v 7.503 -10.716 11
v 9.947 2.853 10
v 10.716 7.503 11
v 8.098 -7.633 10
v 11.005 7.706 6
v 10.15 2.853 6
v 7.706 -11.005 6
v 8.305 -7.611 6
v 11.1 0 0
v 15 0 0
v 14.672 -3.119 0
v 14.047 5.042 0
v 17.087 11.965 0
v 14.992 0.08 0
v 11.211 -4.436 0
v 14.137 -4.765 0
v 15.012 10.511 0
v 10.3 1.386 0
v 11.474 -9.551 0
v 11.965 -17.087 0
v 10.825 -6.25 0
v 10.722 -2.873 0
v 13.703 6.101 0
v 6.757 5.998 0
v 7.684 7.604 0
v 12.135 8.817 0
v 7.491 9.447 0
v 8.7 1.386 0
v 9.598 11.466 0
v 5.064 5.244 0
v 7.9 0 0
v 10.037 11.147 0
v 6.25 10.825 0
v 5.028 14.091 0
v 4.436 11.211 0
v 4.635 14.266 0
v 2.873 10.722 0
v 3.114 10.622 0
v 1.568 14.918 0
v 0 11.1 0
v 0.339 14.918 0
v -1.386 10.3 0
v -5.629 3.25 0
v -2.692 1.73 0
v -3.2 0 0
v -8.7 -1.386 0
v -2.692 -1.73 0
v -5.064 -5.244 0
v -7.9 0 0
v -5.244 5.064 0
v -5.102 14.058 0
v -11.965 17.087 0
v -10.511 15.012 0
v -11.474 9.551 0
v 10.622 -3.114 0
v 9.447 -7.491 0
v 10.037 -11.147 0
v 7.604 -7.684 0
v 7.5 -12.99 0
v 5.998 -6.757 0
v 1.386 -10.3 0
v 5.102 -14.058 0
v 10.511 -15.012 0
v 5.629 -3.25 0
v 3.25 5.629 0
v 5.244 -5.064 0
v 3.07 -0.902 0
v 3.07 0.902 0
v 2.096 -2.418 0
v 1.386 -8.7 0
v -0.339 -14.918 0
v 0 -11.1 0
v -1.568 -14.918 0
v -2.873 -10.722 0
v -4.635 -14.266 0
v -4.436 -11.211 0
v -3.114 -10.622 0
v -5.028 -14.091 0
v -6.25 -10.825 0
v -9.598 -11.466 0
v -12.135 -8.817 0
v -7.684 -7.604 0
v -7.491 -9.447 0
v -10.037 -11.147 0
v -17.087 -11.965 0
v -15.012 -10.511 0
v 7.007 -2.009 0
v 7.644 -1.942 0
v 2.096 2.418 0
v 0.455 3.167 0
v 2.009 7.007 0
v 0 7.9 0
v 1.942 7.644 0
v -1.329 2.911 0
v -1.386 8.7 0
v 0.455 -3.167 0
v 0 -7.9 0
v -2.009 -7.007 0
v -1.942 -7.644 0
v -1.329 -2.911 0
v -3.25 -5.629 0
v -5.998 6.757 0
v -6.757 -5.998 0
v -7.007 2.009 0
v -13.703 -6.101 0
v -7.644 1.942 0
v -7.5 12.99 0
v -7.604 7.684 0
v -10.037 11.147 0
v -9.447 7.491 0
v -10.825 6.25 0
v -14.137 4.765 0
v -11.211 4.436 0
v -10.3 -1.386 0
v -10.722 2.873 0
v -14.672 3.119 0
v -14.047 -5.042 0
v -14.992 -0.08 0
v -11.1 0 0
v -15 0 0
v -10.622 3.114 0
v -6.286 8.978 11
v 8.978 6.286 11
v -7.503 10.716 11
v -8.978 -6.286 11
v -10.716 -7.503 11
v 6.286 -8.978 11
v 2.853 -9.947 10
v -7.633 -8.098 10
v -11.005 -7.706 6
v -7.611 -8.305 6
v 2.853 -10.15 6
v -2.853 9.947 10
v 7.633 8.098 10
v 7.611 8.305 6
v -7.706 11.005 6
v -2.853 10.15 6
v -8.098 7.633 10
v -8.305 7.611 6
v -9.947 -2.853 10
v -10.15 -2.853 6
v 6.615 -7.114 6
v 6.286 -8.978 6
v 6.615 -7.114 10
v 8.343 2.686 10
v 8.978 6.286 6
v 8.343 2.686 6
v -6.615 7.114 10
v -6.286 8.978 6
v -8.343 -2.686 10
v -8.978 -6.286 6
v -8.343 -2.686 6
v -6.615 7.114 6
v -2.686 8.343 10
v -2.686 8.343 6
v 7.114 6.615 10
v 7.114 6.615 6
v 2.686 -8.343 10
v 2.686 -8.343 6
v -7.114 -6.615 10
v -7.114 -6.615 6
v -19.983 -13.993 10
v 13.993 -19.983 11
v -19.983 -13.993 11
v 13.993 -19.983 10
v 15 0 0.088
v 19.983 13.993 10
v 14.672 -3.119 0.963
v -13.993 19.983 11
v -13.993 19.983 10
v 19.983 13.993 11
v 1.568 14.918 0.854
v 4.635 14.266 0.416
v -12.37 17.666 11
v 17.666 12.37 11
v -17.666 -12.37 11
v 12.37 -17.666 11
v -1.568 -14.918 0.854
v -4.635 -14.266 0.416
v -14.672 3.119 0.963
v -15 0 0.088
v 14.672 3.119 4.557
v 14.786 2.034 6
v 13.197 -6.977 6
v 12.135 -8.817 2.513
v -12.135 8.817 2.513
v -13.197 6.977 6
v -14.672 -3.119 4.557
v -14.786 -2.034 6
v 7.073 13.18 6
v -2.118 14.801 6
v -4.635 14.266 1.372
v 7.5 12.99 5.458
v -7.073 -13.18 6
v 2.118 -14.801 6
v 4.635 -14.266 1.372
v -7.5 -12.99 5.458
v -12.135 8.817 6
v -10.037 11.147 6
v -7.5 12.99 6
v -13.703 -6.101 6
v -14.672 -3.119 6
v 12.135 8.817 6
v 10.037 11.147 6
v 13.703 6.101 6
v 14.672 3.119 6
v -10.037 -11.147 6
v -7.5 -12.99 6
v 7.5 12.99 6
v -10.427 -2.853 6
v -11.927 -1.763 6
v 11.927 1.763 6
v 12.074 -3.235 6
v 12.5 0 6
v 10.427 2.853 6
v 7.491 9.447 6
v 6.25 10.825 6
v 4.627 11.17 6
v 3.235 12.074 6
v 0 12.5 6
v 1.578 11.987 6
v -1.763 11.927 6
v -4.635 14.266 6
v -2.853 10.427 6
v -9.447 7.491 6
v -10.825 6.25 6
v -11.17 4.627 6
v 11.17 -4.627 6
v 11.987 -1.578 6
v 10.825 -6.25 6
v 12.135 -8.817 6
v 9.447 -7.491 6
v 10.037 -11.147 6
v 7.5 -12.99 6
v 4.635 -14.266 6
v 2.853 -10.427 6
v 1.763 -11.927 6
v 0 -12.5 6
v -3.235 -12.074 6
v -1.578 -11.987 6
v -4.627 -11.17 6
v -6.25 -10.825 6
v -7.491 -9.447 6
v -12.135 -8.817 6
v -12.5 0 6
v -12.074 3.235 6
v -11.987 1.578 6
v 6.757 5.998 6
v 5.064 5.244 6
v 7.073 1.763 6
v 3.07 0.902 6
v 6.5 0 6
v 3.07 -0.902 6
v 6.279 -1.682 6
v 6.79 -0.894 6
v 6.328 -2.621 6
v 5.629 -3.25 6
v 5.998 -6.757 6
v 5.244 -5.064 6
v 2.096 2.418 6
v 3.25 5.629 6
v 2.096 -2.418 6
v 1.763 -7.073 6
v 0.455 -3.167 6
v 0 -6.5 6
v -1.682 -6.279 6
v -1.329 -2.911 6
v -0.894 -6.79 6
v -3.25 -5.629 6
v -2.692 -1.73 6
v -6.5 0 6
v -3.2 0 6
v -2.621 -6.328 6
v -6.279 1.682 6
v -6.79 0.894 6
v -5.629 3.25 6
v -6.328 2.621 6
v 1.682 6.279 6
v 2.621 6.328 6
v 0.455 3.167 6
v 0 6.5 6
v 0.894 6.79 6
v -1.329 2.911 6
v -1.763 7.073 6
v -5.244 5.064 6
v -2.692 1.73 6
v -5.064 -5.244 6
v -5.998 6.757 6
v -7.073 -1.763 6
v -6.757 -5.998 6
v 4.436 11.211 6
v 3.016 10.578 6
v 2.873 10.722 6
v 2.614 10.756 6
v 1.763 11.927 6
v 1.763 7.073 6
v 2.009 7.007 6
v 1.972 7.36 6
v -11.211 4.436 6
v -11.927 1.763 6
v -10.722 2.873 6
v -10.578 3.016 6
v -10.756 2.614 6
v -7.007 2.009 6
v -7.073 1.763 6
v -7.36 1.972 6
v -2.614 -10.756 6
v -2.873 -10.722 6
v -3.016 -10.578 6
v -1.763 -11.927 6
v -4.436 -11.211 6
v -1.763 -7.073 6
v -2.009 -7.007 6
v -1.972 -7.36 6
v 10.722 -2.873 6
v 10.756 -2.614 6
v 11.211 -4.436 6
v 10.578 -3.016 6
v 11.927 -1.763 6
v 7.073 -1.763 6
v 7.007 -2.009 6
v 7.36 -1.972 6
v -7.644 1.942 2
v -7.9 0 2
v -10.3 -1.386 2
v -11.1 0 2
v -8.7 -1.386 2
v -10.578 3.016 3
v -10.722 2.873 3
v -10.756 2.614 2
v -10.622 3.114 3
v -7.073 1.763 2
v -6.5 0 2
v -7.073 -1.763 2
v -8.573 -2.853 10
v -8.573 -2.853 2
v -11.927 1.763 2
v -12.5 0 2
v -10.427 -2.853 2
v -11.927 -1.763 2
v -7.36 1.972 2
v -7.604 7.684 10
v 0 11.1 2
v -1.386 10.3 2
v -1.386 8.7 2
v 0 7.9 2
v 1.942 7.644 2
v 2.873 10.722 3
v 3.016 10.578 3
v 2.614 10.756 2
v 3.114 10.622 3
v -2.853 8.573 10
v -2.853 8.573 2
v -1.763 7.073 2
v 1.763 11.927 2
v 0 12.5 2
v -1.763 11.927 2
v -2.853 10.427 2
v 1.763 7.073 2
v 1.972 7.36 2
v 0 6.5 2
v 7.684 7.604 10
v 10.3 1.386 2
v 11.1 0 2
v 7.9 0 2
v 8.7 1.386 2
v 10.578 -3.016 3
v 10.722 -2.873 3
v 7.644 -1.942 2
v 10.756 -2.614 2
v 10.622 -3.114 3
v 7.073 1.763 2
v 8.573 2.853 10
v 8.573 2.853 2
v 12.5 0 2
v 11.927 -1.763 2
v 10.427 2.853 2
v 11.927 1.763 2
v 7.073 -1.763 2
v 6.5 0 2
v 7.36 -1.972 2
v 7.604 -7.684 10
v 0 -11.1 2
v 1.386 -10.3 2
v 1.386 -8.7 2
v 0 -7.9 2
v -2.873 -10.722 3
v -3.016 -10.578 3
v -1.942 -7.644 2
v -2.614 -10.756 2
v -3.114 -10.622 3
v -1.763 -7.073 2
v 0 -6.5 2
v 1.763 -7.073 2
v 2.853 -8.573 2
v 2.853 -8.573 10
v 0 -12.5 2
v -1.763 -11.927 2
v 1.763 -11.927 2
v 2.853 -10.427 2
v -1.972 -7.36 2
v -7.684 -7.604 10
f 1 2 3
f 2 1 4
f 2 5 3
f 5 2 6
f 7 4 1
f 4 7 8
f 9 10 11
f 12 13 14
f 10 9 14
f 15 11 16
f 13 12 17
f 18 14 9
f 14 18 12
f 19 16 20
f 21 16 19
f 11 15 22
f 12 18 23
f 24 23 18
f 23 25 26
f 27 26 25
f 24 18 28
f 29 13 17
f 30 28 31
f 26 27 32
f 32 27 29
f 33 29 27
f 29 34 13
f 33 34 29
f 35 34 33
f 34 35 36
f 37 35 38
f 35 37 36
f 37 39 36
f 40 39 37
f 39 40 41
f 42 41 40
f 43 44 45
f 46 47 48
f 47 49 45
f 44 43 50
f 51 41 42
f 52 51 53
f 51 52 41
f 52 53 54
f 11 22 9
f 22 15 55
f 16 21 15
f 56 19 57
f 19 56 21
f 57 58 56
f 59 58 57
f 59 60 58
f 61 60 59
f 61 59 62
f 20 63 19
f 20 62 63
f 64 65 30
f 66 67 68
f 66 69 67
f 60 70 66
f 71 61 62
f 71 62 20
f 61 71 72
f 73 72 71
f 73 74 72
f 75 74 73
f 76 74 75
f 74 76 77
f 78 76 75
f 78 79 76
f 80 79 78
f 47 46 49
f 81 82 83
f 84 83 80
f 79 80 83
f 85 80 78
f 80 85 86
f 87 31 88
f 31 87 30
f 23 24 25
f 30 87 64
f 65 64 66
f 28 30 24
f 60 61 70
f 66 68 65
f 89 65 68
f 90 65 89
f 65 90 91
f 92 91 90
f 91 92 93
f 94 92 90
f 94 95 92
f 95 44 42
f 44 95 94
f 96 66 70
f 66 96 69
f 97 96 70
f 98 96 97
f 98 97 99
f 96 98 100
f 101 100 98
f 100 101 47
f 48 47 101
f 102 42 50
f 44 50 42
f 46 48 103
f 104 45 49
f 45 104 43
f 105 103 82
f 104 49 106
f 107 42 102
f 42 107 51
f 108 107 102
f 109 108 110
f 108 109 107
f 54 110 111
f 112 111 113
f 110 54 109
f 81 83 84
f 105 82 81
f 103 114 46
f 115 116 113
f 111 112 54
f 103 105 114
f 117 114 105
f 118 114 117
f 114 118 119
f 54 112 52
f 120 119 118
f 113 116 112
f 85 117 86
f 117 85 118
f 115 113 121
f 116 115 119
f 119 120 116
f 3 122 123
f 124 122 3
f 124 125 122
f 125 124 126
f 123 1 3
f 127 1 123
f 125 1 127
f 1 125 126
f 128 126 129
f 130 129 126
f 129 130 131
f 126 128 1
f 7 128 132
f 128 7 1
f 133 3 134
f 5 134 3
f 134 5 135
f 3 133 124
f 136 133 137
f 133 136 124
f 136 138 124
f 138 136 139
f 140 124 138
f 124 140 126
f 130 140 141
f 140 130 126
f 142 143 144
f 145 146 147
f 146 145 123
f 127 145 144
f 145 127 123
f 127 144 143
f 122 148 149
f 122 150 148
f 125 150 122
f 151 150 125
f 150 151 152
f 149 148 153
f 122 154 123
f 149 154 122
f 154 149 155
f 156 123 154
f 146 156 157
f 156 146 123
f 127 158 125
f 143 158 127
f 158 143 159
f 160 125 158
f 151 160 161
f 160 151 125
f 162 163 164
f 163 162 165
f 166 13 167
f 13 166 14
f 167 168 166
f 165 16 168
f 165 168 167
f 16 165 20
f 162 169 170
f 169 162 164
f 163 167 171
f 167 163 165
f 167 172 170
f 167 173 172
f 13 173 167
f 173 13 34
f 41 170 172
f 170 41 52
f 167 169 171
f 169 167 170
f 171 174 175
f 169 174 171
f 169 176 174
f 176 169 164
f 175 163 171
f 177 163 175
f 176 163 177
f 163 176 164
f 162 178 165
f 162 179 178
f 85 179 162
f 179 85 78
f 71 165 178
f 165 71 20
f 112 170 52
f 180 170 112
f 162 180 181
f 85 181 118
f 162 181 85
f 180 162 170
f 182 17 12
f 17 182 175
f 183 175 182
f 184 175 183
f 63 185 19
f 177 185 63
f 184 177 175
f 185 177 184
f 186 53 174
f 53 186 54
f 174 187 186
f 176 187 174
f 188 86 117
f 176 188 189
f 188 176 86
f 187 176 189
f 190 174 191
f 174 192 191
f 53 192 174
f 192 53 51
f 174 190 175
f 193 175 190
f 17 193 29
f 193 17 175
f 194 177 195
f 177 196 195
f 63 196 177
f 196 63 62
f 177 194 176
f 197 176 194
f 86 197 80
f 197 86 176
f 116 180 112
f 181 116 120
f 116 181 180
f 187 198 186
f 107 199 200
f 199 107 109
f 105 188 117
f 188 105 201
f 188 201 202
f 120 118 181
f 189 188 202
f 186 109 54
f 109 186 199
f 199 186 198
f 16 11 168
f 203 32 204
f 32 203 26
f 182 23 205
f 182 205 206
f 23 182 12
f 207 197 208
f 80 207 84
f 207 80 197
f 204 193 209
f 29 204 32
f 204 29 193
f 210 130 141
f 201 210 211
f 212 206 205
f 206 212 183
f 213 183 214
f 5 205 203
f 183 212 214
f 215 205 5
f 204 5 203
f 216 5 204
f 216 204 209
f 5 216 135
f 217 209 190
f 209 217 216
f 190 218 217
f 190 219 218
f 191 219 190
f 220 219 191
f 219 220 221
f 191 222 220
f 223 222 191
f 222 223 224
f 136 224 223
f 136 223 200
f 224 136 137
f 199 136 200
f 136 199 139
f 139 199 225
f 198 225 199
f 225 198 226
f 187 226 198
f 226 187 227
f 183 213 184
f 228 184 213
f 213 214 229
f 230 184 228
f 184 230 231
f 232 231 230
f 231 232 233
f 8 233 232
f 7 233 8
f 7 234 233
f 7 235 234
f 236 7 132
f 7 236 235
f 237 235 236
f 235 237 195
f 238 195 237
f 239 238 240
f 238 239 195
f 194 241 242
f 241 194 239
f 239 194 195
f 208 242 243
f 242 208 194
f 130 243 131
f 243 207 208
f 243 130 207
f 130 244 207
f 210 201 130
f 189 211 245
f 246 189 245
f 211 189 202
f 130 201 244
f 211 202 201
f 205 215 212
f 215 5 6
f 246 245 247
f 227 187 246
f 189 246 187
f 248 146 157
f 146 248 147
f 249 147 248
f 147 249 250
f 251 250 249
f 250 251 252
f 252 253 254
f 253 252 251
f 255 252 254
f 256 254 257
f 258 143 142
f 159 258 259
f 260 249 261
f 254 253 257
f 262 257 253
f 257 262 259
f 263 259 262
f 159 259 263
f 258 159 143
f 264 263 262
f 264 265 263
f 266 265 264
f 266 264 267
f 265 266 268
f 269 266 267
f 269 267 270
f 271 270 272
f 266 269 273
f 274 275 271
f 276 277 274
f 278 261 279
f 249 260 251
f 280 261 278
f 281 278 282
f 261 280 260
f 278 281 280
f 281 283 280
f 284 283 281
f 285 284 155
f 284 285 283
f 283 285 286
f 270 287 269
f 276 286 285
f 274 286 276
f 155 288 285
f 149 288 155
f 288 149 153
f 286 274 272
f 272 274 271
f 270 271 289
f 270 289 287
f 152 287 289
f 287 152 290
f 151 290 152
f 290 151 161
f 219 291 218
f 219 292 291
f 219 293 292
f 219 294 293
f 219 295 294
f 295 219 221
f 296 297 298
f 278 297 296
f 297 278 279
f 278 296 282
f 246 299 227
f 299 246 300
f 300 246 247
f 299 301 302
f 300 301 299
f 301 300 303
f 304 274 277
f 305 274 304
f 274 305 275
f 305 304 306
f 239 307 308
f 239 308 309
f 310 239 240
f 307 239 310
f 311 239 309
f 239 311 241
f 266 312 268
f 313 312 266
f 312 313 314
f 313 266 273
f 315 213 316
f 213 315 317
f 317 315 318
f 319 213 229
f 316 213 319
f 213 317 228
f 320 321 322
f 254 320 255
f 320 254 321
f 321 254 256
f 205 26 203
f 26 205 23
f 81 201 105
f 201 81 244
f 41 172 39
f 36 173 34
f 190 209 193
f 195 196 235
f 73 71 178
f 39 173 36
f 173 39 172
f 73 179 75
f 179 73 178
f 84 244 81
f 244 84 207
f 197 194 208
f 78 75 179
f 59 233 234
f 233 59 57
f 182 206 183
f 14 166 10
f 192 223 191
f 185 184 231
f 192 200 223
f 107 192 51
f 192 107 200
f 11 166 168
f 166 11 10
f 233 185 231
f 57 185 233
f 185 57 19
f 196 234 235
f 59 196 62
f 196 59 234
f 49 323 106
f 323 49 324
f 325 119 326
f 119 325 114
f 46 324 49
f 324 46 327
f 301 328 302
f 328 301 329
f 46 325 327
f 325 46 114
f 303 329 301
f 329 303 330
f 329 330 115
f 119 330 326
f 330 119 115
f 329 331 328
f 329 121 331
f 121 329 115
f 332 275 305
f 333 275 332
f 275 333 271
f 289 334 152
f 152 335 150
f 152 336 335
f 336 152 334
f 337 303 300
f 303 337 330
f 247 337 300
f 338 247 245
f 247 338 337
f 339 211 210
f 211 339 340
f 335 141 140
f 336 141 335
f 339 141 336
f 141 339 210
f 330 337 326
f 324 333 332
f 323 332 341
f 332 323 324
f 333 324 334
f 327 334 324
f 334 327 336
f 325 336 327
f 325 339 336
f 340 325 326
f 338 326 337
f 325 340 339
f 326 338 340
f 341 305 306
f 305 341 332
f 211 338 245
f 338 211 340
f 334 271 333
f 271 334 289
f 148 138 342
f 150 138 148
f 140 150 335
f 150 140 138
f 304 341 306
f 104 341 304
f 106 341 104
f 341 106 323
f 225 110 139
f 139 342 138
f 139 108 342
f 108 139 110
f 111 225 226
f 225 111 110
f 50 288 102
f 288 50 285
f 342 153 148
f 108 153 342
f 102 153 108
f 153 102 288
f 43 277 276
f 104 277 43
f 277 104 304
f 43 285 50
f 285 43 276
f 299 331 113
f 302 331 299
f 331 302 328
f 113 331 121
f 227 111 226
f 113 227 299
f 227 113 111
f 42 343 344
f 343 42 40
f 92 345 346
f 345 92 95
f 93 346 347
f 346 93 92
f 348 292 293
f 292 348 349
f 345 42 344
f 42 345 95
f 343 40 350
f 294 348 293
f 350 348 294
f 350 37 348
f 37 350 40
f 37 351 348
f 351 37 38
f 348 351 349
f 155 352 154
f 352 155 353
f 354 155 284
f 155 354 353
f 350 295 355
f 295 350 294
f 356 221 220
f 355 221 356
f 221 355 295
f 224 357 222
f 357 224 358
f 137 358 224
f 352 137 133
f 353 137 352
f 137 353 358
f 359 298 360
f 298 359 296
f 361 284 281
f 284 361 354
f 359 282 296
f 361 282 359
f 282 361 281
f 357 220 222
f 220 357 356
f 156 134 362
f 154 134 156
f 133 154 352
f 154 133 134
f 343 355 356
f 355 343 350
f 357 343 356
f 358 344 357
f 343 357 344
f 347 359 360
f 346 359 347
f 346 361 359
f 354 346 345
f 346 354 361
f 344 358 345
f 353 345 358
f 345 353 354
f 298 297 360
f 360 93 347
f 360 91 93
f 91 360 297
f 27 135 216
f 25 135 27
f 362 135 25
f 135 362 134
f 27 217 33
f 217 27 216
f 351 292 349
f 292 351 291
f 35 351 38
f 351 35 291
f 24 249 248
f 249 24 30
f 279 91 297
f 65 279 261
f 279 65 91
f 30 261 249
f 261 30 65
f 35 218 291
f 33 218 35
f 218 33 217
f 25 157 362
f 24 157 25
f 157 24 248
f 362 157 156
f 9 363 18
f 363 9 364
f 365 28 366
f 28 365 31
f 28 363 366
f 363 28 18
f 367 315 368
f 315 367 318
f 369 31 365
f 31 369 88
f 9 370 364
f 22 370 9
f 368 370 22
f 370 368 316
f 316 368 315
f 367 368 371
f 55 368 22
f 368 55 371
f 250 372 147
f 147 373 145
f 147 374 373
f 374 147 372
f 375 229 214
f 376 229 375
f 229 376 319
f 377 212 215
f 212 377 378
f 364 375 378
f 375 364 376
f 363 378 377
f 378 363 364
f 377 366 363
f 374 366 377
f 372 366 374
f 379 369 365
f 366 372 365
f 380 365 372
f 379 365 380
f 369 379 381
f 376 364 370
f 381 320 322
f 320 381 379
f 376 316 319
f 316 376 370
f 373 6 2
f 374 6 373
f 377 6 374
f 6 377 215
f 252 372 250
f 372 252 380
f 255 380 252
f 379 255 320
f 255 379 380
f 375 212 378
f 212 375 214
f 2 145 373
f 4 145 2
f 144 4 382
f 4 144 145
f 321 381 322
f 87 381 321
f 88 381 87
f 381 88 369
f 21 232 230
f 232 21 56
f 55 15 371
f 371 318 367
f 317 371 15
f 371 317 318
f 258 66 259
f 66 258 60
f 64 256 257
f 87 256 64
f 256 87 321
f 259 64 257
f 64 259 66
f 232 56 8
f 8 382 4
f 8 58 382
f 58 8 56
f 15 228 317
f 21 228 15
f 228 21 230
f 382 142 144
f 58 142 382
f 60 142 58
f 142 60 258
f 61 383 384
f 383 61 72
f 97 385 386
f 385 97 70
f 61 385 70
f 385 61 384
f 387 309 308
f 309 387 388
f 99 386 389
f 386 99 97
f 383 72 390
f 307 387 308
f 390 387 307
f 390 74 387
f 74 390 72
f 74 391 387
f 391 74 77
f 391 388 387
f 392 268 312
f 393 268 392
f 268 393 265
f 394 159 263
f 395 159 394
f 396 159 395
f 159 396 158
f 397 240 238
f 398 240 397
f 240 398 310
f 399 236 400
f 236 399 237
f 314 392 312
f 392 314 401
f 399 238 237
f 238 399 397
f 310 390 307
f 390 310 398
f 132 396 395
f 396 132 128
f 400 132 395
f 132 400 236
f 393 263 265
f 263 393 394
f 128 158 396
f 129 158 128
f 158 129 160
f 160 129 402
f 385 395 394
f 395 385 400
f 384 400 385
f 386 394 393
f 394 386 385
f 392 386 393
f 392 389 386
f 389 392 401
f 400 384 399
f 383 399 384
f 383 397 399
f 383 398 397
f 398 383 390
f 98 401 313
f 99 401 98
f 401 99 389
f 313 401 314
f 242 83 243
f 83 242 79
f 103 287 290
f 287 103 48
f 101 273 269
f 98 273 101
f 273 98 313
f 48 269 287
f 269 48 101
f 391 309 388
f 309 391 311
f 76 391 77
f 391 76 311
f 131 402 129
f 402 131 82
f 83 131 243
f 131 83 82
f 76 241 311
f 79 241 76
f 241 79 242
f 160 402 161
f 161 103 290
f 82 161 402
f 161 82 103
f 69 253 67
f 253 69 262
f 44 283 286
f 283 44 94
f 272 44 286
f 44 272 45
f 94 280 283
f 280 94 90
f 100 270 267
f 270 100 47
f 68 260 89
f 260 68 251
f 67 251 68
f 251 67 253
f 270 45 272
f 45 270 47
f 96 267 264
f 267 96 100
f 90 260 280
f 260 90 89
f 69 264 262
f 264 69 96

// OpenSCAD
// Copyright 2013 Peter Withers
// Licensed as GPL 2

noseConeLength = 10;
noseConeCapHeight = 6;
motorRadius = 15;
motorShaftHoleRadius = 1.6;
motorShaftHoleDepth = noseConeLength;
boltDiameter = 1.6;
boltCapDiameter = 3;
boltCapHeight = 4;
boldHeadIndentationDepth = 4.0;
boltDistance = 9.5;
wallThickness = 2;
mountWidth = 19.5;

module taperedBox(widthA, widthB, length){
	translate([0,0,-length/2])
	//rotate([0,0,0])%linear_extrude(height = noseConeLength, center = true, convexity = 10, twist = 0)
	hull(){
		cube([widthA,widthA,1], center=true);
		translate([0,0,length])cube([widthB,widthB,1], center=true);
	}
}

module fuselageMount(motorRadius,noseConeLength, wallThickness){
//	mountWidth = motorRadius * 1.7;
	// make the inner support
	difference(){
		taperedBox(mountWidth,mountWidth-1,noseConeLength);
		translate([0,0,0])taperedBox(mountWidth-wallThickness*2,mountWidth-wallThickness*2,noseConeLength+2);
	}
	// make the outer support
	difference(){
		taperedBox(mountWidth+10,mountWidth+15,noseConeLength);
		translate([0,0,0])taperedBox(mountWidth+10-wallThickness*2,mountWidth+15-wallThickness*2,noseConeLength+2);
	}
}

module noseCone(){
    //echo(str("noseCone(", noseConeLength, ",", motorRadius, ",", boltDiameter, ",", boltDistance, ",", wallThickness, ",", skewerRadius, ");"));
    //ribRadius = motorRadius;
    difference(){
        union(){
            translate([0,0,noseConeCapHeight/2])cylinder(h=noseConeCapHeight, r=motorRadius, center=true);
            //translate([0,0,noseConeLength/2+noseConeCapHeight/2])
            translate([0,0,noseConeLength/2+0.5])
				rotate([0,0,10])fuselageMount(motorRadius,noseConeLength, wallThickness); //fuselageRib(motorRadius,noseConeLength, wallThickness, skewerRadius, false);
        }
        for (rotation = [0,90,180,270]){
            // make the bolt hole and the space for the bolt cap to be passed through
            hull(){
                rotate([0,0,rotation])translate([boltDistance,0,0]) cylinder(h=noseConeCapHeight*2+3, r=boltDiameter, center=true);
                rotate([0,0,rotation+15])translate([boltDistance,0,0]) cylinder(h=noseConeCapHeight*2+3, r=boltDiameter, center=true);
            }
            hull(){
                rotate([0,0,rotation+15])translate([boltDistance,0,0]) cylinder(h=noseConeCapHeight, r=boltDiameter, center=true);
                rotate([0,0,rotation+30])translate([boltDistance,0,0]) cylinder(h=noseConeCapHeight, r=boltDiameter, center=true);
            }
            // make a hole for the bolt head through the strut and an indentation so the bolt head keys into place				
            rotate([0,0,rotation])translate([boltDistance,0,noseConeCapHeight+(boltCapHeight/2)-boldHeadIndentationDepth/2]) cylinder(h=boltCapHeight+boldHeadIndentationDepth, r=boltCapDiameter, center=true);
				// create a gap in the struts for the bold head to be rotated through
            rotate([0,0,rotation+15])translate([boltDistance,0,noseConeCapHeight+(boltCapHeight/2)]) cylinder(h=boltCapHeight, r=boltCapDiameter, center=true);
				// create a hole for the bolt head to pass through the platess
            rotate([0,0,rotation+30])translate([boltDistance,0,0]) cylinder(h=boltCapHeight*2+noseConeCapHeight*2, r=boltCapDiameter, center=true);
        }
		// make a hole for the motor shaft
		cylinder(h=motorShaftHoleDepth*2, r=motorShaftHoleRadius*2, center=true);
    }
}
scale([-1,1,1])
noseCone();
